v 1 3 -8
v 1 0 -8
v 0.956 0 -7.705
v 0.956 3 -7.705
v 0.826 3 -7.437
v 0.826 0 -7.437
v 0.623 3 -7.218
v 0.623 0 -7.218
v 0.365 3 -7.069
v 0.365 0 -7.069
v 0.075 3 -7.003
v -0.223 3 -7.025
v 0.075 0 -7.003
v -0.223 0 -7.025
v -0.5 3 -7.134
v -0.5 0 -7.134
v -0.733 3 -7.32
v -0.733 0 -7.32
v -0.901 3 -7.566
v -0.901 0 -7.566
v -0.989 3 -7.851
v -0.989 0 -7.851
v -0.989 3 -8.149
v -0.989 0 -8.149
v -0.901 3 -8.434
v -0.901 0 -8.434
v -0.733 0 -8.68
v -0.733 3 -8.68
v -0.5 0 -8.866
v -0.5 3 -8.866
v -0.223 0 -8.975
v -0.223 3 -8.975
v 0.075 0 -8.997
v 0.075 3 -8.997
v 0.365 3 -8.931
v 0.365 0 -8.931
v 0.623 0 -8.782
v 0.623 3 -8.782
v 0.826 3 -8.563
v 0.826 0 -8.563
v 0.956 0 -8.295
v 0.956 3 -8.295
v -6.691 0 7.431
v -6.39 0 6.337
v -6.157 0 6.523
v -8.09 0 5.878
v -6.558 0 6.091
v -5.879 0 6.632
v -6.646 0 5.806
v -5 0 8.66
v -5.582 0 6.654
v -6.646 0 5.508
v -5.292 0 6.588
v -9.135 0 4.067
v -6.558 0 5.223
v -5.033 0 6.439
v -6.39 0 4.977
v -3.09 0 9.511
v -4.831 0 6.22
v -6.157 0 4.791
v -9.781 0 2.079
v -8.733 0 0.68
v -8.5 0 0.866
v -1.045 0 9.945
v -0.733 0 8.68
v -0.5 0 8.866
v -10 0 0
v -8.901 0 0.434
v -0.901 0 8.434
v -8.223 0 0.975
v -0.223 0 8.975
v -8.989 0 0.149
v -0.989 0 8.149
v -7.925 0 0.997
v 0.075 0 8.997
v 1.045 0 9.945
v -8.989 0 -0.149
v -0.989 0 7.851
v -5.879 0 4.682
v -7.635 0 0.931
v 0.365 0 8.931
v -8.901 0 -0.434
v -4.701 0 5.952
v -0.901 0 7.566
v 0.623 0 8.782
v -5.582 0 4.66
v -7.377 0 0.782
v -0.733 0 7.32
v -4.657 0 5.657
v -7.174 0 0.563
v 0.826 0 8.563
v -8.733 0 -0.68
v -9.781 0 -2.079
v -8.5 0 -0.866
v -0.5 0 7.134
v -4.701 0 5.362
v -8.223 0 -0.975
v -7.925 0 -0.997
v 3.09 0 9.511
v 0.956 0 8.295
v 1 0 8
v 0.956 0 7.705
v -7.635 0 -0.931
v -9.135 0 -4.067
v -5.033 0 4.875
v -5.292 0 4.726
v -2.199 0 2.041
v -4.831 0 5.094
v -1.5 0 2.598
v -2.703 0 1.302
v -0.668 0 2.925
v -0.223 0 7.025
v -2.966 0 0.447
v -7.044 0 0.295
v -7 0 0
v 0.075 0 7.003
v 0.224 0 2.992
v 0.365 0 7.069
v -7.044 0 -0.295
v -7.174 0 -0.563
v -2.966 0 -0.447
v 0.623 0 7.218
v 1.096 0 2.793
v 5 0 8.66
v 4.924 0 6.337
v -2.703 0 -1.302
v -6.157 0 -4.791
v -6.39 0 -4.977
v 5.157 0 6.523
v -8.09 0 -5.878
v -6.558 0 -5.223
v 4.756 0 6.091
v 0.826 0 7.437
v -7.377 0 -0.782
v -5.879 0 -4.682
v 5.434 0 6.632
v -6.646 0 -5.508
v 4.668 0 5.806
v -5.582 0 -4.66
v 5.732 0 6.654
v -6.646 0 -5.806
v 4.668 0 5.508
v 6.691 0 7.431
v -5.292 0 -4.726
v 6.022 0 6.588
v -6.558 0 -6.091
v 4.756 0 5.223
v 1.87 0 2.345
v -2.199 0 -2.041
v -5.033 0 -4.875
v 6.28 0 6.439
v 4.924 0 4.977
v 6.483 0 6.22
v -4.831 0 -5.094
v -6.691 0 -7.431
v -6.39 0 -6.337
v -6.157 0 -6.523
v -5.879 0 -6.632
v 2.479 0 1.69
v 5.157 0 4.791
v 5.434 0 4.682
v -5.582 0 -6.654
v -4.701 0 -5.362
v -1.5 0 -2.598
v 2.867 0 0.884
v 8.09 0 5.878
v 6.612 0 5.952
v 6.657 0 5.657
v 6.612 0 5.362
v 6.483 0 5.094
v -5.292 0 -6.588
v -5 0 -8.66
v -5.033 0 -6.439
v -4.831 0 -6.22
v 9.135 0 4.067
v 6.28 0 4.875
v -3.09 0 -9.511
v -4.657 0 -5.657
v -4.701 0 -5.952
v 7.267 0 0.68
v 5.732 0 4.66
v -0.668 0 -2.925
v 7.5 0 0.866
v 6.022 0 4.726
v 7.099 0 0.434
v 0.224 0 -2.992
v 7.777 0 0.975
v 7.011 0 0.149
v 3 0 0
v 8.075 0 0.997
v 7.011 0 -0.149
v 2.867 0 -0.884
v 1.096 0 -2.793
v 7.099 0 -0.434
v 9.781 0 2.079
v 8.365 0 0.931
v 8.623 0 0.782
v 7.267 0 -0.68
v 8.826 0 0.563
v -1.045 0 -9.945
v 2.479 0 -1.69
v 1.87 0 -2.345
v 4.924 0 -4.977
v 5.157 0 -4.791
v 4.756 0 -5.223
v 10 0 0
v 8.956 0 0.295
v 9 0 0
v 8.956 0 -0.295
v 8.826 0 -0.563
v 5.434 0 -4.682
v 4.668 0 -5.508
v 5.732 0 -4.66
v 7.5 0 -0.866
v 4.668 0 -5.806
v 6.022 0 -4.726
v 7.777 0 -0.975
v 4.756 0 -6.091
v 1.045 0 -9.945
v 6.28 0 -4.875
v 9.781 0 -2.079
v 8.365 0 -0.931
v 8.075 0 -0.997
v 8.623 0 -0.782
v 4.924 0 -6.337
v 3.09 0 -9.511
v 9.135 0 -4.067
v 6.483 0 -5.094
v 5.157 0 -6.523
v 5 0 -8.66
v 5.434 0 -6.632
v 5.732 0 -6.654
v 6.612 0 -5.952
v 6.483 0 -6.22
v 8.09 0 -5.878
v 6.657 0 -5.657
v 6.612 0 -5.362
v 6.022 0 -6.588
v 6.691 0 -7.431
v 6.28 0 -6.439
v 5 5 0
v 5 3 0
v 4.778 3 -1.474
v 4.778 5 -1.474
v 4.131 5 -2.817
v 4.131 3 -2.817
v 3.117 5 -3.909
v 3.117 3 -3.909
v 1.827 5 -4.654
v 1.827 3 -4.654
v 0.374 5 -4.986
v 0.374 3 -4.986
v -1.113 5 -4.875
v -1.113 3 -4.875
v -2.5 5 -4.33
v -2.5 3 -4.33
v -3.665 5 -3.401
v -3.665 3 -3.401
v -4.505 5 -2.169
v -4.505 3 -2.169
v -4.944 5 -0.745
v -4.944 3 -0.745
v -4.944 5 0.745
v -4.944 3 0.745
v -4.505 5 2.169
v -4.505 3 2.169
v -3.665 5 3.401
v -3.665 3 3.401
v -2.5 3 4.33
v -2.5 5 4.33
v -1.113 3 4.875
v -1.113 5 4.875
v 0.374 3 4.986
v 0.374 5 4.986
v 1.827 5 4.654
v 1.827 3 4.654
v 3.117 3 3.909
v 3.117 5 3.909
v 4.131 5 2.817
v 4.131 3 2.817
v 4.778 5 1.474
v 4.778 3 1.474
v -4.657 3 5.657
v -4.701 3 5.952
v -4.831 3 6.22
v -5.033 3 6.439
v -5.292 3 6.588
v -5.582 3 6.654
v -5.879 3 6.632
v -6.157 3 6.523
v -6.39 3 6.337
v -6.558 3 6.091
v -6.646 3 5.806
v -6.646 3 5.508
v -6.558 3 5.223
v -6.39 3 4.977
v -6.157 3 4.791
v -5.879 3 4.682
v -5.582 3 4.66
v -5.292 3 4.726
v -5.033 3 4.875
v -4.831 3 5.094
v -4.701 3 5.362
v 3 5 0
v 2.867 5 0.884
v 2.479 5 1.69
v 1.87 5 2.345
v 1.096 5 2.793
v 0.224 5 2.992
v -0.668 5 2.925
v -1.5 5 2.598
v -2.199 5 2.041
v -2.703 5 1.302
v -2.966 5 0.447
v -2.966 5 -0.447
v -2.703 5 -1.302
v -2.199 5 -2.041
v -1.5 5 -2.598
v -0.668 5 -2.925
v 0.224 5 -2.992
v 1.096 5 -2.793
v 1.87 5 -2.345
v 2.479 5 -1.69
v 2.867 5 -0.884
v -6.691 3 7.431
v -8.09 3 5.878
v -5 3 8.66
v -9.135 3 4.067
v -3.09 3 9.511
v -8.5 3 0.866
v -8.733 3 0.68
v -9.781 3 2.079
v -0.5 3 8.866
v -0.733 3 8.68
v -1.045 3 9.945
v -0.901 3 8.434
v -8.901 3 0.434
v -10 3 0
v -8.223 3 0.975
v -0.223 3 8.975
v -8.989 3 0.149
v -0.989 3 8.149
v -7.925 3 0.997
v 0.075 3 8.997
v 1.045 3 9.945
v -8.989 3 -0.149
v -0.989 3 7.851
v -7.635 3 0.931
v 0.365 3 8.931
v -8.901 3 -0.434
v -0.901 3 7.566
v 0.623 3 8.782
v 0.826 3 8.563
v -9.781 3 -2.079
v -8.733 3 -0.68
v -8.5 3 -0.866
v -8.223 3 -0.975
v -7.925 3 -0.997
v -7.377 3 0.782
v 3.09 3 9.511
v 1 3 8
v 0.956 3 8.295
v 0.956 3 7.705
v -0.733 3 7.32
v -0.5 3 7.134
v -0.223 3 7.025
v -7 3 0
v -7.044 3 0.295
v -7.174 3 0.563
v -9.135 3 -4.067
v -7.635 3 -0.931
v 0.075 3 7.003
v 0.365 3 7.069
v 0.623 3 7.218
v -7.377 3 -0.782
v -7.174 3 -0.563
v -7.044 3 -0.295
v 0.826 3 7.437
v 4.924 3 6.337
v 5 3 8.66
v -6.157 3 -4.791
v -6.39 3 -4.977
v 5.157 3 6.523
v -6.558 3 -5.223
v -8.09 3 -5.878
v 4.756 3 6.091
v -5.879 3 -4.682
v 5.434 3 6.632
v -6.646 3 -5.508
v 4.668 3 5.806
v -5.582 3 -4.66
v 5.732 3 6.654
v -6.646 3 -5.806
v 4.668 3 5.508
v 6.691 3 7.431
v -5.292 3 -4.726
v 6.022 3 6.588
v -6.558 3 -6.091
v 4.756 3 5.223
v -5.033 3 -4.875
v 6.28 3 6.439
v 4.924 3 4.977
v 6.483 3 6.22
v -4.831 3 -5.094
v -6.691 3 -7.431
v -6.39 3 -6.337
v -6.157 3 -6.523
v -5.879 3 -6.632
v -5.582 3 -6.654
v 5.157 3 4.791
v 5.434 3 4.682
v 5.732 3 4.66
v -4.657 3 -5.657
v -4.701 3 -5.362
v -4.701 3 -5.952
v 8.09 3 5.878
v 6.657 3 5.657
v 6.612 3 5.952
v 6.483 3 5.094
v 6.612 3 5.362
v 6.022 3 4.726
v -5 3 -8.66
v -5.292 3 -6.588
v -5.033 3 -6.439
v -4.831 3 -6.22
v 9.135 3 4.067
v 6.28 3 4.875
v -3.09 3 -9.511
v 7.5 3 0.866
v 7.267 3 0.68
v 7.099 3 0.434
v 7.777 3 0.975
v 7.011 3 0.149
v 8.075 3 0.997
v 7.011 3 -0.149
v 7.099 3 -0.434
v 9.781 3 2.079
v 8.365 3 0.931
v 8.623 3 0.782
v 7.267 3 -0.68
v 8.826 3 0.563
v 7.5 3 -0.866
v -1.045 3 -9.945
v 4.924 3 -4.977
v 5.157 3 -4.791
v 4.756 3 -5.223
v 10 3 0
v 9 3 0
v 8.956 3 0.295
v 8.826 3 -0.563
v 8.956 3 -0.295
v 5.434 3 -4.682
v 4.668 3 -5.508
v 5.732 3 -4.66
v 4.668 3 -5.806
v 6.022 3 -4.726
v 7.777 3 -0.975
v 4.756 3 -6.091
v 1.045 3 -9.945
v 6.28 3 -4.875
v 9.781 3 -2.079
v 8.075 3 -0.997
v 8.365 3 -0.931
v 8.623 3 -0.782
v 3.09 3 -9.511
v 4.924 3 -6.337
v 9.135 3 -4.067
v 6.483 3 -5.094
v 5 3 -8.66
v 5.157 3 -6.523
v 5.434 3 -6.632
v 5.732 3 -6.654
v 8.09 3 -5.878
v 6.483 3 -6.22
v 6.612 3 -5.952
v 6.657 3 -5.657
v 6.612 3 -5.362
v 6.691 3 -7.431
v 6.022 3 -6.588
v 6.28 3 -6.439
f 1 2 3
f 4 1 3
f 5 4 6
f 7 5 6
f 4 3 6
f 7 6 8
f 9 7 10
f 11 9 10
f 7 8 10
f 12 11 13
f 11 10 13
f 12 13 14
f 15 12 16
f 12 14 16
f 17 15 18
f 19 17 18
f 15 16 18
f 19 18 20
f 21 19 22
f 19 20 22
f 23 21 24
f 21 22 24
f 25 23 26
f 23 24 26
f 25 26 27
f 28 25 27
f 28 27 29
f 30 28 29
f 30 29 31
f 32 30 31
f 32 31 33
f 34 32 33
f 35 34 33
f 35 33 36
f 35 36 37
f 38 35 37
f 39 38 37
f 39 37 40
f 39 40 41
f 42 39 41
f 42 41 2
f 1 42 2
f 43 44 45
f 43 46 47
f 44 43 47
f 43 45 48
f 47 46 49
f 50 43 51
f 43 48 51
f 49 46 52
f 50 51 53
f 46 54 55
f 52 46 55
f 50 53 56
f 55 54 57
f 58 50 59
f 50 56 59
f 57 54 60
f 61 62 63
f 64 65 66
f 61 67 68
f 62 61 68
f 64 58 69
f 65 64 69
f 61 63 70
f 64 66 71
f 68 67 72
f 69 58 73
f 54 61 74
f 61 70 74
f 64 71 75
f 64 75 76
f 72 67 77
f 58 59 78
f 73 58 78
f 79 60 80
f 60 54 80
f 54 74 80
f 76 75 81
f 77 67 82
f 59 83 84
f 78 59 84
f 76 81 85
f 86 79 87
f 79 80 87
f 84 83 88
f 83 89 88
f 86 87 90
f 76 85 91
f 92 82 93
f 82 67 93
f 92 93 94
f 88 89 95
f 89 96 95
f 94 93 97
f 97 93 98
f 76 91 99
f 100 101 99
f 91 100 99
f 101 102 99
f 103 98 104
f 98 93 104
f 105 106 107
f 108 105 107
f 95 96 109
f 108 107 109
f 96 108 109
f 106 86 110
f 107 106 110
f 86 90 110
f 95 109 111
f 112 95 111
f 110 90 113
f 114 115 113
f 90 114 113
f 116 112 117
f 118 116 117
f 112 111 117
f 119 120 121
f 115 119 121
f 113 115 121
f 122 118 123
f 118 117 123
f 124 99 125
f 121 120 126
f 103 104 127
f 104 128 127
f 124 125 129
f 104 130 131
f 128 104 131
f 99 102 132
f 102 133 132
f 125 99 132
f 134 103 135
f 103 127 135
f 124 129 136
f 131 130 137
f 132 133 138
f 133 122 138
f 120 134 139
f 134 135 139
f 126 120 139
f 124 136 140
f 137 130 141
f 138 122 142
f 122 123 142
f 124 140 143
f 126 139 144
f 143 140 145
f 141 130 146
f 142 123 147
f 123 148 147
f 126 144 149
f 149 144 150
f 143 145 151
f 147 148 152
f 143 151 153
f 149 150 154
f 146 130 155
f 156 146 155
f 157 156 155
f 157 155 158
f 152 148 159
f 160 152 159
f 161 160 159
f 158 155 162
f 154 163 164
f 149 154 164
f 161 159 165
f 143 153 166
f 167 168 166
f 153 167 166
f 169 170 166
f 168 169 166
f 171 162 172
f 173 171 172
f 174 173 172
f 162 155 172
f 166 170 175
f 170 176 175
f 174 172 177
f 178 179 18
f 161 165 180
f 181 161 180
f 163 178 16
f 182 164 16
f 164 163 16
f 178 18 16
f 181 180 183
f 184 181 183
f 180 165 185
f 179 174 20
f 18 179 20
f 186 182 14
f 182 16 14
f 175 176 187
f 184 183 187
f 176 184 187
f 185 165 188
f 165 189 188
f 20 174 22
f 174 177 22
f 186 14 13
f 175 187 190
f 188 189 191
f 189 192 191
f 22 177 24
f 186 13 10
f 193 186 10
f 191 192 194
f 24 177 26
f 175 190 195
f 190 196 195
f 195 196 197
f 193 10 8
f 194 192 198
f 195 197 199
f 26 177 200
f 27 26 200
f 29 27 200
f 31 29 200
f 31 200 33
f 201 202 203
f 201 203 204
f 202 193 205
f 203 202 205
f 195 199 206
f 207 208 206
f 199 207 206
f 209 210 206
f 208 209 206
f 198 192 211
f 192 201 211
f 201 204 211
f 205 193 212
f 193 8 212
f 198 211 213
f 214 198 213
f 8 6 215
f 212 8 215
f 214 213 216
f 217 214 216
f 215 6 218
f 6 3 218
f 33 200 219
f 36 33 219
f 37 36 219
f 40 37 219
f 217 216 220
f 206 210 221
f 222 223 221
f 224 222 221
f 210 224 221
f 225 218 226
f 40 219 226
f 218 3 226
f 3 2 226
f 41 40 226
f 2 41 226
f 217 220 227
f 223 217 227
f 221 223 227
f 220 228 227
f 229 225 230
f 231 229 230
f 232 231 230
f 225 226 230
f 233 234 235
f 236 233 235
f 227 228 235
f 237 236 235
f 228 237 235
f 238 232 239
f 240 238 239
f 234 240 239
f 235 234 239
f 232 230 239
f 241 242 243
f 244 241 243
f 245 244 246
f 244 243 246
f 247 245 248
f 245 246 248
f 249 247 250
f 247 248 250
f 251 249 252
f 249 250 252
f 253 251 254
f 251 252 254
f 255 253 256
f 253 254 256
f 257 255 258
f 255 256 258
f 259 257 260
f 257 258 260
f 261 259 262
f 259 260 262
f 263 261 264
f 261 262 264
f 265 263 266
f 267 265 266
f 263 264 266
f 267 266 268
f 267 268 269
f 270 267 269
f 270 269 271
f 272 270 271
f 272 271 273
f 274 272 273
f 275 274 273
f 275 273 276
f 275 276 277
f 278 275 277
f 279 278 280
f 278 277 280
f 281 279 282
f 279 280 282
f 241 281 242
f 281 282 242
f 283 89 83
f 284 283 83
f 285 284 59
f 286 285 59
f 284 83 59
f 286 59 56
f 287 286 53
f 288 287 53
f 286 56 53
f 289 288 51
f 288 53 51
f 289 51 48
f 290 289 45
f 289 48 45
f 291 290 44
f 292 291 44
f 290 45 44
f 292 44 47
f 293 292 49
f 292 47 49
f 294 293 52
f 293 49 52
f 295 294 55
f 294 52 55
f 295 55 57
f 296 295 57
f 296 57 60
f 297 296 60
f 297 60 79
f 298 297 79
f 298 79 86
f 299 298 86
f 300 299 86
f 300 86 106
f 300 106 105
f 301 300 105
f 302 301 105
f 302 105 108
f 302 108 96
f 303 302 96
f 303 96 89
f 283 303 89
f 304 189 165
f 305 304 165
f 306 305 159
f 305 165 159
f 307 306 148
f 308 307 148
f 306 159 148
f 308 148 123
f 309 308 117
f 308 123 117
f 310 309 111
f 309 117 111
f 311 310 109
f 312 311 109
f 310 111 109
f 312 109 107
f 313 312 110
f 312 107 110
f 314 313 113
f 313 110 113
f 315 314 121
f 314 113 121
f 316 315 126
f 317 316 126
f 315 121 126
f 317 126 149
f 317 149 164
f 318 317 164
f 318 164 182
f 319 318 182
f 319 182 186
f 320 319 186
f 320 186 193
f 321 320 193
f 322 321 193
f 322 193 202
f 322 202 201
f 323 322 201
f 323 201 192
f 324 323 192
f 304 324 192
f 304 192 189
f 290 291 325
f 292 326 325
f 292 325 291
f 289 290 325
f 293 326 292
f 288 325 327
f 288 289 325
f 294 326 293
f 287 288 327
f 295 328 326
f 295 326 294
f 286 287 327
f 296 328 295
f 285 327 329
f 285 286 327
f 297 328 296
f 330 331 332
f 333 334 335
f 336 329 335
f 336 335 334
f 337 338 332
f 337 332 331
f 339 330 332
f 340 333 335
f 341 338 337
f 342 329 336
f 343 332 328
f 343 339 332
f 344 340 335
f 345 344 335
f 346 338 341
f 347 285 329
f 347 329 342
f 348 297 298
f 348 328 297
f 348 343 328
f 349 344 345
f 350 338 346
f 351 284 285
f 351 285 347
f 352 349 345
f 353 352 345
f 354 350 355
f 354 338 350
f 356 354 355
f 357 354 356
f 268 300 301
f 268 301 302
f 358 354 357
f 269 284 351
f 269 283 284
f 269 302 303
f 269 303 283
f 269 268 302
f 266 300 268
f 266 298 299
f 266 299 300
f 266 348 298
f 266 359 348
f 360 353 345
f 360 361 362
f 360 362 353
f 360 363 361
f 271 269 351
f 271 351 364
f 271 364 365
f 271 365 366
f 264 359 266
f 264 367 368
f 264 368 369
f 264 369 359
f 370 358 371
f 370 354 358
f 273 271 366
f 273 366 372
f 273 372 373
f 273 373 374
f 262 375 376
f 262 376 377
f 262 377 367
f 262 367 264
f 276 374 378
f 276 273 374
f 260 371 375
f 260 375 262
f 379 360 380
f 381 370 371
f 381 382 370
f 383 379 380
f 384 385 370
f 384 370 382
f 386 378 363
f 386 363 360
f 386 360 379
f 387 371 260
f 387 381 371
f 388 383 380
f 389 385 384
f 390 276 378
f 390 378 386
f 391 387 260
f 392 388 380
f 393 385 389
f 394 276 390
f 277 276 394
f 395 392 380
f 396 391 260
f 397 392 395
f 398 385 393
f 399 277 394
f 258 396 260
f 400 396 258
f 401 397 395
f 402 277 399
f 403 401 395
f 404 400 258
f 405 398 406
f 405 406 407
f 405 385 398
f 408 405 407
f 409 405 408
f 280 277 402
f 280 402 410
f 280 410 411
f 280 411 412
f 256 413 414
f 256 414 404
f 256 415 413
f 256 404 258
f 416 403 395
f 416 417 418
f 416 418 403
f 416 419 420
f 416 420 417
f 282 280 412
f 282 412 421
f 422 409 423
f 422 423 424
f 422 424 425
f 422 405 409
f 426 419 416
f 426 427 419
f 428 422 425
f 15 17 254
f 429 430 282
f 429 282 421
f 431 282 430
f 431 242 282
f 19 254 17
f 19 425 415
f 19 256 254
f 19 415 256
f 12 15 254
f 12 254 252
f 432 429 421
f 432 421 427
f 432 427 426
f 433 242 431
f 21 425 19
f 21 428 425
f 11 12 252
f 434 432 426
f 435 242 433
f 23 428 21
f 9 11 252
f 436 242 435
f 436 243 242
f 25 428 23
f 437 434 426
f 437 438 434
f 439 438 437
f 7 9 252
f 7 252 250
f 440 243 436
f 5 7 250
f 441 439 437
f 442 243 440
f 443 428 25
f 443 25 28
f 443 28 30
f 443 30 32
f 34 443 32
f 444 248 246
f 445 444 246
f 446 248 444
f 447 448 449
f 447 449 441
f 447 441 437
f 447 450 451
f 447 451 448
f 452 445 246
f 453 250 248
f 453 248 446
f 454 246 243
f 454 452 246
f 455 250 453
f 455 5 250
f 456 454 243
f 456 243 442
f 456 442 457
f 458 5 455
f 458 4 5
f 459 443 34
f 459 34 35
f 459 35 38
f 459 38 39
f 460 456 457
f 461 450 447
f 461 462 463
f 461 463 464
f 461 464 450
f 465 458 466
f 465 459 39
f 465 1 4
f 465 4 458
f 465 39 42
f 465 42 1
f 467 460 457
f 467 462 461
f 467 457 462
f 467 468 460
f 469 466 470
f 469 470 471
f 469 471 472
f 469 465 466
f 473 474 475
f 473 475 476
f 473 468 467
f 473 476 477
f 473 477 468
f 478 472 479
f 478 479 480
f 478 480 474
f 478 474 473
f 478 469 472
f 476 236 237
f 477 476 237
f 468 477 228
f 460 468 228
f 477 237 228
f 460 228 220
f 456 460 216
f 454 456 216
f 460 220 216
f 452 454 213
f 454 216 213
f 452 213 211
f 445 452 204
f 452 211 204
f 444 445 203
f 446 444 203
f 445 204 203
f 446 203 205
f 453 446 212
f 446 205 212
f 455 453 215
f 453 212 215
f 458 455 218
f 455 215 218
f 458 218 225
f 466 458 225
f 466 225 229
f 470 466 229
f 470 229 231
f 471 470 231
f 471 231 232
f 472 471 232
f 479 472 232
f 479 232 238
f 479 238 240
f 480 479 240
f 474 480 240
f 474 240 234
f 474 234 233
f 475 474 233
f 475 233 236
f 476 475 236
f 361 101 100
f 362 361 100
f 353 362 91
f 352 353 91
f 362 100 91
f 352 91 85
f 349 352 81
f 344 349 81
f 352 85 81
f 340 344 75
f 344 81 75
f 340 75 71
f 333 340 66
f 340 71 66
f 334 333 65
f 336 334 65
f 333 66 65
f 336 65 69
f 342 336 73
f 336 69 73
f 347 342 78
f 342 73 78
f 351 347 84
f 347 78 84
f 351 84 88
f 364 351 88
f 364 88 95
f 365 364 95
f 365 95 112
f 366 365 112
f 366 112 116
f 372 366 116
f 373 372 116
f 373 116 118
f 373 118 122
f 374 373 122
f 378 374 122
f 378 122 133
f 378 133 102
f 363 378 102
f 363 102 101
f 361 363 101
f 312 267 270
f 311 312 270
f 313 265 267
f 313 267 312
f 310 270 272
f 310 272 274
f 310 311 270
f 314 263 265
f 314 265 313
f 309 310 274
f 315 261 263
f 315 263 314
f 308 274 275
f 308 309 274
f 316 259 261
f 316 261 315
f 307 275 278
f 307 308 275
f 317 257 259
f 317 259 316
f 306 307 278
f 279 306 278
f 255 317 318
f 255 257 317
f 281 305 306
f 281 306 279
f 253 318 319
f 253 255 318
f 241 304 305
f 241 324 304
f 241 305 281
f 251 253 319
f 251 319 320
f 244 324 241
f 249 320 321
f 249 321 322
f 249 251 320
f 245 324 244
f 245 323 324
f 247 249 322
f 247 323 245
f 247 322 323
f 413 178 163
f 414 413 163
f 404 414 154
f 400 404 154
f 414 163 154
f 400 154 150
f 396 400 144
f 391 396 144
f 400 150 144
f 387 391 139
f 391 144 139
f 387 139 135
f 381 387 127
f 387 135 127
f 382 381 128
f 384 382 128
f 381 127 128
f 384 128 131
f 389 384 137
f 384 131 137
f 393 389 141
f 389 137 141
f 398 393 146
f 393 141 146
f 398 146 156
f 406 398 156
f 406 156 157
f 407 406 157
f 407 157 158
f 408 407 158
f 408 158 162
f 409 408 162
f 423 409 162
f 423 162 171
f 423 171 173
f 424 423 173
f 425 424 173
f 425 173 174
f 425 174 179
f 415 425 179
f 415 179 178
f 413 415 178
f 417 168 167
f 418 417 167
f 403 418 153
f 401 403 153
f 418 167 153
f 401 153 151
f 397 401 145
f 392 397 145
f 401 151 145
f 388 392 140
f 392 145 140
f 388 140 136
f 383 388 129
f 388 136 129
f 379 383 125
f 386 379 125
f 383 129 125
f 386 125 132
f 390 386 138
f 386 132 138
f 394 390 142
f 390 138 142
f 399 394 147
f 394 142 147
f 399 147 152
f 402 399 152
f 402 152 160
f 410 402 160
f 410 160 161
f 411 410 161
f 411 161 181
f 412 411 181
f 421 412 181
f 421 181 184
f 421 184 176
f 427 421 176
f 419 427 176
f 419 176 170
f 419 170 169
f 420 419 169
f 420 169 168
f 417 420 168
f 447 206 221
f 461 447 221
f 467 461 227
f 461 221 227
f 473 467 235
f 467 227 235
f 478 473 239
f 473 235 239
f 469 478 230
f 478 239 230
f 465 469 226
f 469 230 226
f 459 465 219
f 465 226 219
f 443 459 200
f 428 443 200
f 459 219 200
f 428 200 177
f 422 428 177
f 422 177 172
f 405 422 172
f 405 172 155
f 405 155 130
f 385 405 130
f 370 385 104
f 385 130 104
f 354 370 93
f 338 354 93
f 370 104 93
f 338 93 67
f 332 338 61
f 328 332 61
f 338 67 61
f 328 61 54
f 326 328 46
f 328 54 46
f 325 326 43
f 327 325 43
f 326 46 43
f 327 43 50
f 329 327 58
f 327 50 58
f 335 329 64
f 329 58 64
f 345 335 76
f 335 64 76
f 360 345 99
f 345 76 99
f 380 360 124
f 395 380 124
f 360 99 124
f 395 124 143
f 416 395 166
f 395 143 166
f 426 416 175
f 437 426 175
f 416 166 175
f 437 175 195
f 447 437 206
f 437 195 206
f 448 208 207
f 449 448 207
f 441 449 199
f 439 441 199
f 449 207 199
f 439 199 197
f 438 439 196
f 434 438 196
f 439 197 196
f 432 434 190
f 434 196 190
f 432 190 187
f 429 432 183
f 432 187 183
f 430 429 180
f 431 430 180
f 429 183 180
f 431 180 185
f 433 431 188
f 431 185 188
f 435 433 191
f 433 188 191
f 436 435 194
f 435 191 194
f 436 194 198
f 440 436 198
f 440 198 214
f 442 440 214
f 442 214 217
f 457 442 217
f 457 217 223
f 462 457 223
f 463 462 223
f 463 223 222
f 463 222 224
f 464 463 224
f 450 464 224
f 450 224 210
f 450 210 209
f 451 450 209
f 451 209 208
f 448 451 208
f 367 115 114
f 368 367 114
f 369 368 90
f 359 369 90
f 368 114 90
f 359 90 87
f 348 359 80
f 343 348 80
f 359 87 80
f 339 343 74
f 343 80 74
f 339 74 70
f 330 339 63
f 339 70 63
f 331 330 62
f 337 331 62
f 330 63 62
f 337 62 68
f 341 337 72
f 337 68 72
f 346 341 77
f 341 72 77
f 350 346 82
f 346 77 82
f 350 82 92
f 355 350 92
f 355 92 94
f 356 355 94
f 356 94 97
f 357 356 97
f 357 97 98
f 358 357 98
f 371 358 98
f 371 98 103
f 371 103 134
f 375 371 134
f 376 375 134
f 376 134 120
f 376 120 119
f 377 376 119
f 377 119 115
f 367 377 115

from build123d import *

# Parameters (mm, degrees)
SKETCH_1_R          = 10
EXTRUDE_1_DEPTH     = 3
SKETCH_2_R          = 5
EXTRUDE_2_DEPTH     = 2
SKETCH_3_R          = 3
SKETCH_3_R_2        = 1
CUT_EXTRUDE_1_DEPTH = 6


with BuildPart() as part:
    # 草图1 → 凸台-拉伸1 (new body)
    with BuildSketch(Plane(origin=(0, 0, 0), x_dir=(1, 0, 0), z_dir=(0, 1, 0))):
        Circle(SKETCH_1_R)
    extrude(amount=EXTRUDE_1_DEPTH)

    # 草图2 → 凸台-拉伸2 (add)
    with BuildSketch(Plane(origin=(0, 3, 0), x_dir=(1, 0, 0), z_dir=(0, 1, 0))):
        Circle(SKETCH_2_R)
    extrude(amount=EXTRUDE_2_DEPTH)

    # 草图3 → 切除-拉伸1 (cut, through all)
    with BuildSketch(Plane.XZ):
        Circle(SKETCH_3_R)
        with Locations((0, 8)):
            Circle(SKETCH_3_R_2)
        with Locations((5.656854249, 5.656854249)):
            Circle(SKETCH_3_R_2)
        with Locations((8, 0)):
            Circle(SKETCH_3_R_2)
        with Locations((5.656854249, -5.656854249)):
            Circle(SKETCH_3_R_2)
        with Locations((0, -8)):
            Circle(SKETCH_3_R_2)
        with Locations((-5.656854249, -5.656854249)):
            Circle(SKETCH_3_R_2)
        with Locations((-8, 0)):
            Circle(SKETCH_3_R_2)
        with Locations((-5.656854249, 5.656854249)):
            Circle(SKETCH_3_R_2)
    extrude(amount=-CUT_EXTRUDE_1_DEPTH, mode=Mode.SUBTRACT)


solid = part.part
